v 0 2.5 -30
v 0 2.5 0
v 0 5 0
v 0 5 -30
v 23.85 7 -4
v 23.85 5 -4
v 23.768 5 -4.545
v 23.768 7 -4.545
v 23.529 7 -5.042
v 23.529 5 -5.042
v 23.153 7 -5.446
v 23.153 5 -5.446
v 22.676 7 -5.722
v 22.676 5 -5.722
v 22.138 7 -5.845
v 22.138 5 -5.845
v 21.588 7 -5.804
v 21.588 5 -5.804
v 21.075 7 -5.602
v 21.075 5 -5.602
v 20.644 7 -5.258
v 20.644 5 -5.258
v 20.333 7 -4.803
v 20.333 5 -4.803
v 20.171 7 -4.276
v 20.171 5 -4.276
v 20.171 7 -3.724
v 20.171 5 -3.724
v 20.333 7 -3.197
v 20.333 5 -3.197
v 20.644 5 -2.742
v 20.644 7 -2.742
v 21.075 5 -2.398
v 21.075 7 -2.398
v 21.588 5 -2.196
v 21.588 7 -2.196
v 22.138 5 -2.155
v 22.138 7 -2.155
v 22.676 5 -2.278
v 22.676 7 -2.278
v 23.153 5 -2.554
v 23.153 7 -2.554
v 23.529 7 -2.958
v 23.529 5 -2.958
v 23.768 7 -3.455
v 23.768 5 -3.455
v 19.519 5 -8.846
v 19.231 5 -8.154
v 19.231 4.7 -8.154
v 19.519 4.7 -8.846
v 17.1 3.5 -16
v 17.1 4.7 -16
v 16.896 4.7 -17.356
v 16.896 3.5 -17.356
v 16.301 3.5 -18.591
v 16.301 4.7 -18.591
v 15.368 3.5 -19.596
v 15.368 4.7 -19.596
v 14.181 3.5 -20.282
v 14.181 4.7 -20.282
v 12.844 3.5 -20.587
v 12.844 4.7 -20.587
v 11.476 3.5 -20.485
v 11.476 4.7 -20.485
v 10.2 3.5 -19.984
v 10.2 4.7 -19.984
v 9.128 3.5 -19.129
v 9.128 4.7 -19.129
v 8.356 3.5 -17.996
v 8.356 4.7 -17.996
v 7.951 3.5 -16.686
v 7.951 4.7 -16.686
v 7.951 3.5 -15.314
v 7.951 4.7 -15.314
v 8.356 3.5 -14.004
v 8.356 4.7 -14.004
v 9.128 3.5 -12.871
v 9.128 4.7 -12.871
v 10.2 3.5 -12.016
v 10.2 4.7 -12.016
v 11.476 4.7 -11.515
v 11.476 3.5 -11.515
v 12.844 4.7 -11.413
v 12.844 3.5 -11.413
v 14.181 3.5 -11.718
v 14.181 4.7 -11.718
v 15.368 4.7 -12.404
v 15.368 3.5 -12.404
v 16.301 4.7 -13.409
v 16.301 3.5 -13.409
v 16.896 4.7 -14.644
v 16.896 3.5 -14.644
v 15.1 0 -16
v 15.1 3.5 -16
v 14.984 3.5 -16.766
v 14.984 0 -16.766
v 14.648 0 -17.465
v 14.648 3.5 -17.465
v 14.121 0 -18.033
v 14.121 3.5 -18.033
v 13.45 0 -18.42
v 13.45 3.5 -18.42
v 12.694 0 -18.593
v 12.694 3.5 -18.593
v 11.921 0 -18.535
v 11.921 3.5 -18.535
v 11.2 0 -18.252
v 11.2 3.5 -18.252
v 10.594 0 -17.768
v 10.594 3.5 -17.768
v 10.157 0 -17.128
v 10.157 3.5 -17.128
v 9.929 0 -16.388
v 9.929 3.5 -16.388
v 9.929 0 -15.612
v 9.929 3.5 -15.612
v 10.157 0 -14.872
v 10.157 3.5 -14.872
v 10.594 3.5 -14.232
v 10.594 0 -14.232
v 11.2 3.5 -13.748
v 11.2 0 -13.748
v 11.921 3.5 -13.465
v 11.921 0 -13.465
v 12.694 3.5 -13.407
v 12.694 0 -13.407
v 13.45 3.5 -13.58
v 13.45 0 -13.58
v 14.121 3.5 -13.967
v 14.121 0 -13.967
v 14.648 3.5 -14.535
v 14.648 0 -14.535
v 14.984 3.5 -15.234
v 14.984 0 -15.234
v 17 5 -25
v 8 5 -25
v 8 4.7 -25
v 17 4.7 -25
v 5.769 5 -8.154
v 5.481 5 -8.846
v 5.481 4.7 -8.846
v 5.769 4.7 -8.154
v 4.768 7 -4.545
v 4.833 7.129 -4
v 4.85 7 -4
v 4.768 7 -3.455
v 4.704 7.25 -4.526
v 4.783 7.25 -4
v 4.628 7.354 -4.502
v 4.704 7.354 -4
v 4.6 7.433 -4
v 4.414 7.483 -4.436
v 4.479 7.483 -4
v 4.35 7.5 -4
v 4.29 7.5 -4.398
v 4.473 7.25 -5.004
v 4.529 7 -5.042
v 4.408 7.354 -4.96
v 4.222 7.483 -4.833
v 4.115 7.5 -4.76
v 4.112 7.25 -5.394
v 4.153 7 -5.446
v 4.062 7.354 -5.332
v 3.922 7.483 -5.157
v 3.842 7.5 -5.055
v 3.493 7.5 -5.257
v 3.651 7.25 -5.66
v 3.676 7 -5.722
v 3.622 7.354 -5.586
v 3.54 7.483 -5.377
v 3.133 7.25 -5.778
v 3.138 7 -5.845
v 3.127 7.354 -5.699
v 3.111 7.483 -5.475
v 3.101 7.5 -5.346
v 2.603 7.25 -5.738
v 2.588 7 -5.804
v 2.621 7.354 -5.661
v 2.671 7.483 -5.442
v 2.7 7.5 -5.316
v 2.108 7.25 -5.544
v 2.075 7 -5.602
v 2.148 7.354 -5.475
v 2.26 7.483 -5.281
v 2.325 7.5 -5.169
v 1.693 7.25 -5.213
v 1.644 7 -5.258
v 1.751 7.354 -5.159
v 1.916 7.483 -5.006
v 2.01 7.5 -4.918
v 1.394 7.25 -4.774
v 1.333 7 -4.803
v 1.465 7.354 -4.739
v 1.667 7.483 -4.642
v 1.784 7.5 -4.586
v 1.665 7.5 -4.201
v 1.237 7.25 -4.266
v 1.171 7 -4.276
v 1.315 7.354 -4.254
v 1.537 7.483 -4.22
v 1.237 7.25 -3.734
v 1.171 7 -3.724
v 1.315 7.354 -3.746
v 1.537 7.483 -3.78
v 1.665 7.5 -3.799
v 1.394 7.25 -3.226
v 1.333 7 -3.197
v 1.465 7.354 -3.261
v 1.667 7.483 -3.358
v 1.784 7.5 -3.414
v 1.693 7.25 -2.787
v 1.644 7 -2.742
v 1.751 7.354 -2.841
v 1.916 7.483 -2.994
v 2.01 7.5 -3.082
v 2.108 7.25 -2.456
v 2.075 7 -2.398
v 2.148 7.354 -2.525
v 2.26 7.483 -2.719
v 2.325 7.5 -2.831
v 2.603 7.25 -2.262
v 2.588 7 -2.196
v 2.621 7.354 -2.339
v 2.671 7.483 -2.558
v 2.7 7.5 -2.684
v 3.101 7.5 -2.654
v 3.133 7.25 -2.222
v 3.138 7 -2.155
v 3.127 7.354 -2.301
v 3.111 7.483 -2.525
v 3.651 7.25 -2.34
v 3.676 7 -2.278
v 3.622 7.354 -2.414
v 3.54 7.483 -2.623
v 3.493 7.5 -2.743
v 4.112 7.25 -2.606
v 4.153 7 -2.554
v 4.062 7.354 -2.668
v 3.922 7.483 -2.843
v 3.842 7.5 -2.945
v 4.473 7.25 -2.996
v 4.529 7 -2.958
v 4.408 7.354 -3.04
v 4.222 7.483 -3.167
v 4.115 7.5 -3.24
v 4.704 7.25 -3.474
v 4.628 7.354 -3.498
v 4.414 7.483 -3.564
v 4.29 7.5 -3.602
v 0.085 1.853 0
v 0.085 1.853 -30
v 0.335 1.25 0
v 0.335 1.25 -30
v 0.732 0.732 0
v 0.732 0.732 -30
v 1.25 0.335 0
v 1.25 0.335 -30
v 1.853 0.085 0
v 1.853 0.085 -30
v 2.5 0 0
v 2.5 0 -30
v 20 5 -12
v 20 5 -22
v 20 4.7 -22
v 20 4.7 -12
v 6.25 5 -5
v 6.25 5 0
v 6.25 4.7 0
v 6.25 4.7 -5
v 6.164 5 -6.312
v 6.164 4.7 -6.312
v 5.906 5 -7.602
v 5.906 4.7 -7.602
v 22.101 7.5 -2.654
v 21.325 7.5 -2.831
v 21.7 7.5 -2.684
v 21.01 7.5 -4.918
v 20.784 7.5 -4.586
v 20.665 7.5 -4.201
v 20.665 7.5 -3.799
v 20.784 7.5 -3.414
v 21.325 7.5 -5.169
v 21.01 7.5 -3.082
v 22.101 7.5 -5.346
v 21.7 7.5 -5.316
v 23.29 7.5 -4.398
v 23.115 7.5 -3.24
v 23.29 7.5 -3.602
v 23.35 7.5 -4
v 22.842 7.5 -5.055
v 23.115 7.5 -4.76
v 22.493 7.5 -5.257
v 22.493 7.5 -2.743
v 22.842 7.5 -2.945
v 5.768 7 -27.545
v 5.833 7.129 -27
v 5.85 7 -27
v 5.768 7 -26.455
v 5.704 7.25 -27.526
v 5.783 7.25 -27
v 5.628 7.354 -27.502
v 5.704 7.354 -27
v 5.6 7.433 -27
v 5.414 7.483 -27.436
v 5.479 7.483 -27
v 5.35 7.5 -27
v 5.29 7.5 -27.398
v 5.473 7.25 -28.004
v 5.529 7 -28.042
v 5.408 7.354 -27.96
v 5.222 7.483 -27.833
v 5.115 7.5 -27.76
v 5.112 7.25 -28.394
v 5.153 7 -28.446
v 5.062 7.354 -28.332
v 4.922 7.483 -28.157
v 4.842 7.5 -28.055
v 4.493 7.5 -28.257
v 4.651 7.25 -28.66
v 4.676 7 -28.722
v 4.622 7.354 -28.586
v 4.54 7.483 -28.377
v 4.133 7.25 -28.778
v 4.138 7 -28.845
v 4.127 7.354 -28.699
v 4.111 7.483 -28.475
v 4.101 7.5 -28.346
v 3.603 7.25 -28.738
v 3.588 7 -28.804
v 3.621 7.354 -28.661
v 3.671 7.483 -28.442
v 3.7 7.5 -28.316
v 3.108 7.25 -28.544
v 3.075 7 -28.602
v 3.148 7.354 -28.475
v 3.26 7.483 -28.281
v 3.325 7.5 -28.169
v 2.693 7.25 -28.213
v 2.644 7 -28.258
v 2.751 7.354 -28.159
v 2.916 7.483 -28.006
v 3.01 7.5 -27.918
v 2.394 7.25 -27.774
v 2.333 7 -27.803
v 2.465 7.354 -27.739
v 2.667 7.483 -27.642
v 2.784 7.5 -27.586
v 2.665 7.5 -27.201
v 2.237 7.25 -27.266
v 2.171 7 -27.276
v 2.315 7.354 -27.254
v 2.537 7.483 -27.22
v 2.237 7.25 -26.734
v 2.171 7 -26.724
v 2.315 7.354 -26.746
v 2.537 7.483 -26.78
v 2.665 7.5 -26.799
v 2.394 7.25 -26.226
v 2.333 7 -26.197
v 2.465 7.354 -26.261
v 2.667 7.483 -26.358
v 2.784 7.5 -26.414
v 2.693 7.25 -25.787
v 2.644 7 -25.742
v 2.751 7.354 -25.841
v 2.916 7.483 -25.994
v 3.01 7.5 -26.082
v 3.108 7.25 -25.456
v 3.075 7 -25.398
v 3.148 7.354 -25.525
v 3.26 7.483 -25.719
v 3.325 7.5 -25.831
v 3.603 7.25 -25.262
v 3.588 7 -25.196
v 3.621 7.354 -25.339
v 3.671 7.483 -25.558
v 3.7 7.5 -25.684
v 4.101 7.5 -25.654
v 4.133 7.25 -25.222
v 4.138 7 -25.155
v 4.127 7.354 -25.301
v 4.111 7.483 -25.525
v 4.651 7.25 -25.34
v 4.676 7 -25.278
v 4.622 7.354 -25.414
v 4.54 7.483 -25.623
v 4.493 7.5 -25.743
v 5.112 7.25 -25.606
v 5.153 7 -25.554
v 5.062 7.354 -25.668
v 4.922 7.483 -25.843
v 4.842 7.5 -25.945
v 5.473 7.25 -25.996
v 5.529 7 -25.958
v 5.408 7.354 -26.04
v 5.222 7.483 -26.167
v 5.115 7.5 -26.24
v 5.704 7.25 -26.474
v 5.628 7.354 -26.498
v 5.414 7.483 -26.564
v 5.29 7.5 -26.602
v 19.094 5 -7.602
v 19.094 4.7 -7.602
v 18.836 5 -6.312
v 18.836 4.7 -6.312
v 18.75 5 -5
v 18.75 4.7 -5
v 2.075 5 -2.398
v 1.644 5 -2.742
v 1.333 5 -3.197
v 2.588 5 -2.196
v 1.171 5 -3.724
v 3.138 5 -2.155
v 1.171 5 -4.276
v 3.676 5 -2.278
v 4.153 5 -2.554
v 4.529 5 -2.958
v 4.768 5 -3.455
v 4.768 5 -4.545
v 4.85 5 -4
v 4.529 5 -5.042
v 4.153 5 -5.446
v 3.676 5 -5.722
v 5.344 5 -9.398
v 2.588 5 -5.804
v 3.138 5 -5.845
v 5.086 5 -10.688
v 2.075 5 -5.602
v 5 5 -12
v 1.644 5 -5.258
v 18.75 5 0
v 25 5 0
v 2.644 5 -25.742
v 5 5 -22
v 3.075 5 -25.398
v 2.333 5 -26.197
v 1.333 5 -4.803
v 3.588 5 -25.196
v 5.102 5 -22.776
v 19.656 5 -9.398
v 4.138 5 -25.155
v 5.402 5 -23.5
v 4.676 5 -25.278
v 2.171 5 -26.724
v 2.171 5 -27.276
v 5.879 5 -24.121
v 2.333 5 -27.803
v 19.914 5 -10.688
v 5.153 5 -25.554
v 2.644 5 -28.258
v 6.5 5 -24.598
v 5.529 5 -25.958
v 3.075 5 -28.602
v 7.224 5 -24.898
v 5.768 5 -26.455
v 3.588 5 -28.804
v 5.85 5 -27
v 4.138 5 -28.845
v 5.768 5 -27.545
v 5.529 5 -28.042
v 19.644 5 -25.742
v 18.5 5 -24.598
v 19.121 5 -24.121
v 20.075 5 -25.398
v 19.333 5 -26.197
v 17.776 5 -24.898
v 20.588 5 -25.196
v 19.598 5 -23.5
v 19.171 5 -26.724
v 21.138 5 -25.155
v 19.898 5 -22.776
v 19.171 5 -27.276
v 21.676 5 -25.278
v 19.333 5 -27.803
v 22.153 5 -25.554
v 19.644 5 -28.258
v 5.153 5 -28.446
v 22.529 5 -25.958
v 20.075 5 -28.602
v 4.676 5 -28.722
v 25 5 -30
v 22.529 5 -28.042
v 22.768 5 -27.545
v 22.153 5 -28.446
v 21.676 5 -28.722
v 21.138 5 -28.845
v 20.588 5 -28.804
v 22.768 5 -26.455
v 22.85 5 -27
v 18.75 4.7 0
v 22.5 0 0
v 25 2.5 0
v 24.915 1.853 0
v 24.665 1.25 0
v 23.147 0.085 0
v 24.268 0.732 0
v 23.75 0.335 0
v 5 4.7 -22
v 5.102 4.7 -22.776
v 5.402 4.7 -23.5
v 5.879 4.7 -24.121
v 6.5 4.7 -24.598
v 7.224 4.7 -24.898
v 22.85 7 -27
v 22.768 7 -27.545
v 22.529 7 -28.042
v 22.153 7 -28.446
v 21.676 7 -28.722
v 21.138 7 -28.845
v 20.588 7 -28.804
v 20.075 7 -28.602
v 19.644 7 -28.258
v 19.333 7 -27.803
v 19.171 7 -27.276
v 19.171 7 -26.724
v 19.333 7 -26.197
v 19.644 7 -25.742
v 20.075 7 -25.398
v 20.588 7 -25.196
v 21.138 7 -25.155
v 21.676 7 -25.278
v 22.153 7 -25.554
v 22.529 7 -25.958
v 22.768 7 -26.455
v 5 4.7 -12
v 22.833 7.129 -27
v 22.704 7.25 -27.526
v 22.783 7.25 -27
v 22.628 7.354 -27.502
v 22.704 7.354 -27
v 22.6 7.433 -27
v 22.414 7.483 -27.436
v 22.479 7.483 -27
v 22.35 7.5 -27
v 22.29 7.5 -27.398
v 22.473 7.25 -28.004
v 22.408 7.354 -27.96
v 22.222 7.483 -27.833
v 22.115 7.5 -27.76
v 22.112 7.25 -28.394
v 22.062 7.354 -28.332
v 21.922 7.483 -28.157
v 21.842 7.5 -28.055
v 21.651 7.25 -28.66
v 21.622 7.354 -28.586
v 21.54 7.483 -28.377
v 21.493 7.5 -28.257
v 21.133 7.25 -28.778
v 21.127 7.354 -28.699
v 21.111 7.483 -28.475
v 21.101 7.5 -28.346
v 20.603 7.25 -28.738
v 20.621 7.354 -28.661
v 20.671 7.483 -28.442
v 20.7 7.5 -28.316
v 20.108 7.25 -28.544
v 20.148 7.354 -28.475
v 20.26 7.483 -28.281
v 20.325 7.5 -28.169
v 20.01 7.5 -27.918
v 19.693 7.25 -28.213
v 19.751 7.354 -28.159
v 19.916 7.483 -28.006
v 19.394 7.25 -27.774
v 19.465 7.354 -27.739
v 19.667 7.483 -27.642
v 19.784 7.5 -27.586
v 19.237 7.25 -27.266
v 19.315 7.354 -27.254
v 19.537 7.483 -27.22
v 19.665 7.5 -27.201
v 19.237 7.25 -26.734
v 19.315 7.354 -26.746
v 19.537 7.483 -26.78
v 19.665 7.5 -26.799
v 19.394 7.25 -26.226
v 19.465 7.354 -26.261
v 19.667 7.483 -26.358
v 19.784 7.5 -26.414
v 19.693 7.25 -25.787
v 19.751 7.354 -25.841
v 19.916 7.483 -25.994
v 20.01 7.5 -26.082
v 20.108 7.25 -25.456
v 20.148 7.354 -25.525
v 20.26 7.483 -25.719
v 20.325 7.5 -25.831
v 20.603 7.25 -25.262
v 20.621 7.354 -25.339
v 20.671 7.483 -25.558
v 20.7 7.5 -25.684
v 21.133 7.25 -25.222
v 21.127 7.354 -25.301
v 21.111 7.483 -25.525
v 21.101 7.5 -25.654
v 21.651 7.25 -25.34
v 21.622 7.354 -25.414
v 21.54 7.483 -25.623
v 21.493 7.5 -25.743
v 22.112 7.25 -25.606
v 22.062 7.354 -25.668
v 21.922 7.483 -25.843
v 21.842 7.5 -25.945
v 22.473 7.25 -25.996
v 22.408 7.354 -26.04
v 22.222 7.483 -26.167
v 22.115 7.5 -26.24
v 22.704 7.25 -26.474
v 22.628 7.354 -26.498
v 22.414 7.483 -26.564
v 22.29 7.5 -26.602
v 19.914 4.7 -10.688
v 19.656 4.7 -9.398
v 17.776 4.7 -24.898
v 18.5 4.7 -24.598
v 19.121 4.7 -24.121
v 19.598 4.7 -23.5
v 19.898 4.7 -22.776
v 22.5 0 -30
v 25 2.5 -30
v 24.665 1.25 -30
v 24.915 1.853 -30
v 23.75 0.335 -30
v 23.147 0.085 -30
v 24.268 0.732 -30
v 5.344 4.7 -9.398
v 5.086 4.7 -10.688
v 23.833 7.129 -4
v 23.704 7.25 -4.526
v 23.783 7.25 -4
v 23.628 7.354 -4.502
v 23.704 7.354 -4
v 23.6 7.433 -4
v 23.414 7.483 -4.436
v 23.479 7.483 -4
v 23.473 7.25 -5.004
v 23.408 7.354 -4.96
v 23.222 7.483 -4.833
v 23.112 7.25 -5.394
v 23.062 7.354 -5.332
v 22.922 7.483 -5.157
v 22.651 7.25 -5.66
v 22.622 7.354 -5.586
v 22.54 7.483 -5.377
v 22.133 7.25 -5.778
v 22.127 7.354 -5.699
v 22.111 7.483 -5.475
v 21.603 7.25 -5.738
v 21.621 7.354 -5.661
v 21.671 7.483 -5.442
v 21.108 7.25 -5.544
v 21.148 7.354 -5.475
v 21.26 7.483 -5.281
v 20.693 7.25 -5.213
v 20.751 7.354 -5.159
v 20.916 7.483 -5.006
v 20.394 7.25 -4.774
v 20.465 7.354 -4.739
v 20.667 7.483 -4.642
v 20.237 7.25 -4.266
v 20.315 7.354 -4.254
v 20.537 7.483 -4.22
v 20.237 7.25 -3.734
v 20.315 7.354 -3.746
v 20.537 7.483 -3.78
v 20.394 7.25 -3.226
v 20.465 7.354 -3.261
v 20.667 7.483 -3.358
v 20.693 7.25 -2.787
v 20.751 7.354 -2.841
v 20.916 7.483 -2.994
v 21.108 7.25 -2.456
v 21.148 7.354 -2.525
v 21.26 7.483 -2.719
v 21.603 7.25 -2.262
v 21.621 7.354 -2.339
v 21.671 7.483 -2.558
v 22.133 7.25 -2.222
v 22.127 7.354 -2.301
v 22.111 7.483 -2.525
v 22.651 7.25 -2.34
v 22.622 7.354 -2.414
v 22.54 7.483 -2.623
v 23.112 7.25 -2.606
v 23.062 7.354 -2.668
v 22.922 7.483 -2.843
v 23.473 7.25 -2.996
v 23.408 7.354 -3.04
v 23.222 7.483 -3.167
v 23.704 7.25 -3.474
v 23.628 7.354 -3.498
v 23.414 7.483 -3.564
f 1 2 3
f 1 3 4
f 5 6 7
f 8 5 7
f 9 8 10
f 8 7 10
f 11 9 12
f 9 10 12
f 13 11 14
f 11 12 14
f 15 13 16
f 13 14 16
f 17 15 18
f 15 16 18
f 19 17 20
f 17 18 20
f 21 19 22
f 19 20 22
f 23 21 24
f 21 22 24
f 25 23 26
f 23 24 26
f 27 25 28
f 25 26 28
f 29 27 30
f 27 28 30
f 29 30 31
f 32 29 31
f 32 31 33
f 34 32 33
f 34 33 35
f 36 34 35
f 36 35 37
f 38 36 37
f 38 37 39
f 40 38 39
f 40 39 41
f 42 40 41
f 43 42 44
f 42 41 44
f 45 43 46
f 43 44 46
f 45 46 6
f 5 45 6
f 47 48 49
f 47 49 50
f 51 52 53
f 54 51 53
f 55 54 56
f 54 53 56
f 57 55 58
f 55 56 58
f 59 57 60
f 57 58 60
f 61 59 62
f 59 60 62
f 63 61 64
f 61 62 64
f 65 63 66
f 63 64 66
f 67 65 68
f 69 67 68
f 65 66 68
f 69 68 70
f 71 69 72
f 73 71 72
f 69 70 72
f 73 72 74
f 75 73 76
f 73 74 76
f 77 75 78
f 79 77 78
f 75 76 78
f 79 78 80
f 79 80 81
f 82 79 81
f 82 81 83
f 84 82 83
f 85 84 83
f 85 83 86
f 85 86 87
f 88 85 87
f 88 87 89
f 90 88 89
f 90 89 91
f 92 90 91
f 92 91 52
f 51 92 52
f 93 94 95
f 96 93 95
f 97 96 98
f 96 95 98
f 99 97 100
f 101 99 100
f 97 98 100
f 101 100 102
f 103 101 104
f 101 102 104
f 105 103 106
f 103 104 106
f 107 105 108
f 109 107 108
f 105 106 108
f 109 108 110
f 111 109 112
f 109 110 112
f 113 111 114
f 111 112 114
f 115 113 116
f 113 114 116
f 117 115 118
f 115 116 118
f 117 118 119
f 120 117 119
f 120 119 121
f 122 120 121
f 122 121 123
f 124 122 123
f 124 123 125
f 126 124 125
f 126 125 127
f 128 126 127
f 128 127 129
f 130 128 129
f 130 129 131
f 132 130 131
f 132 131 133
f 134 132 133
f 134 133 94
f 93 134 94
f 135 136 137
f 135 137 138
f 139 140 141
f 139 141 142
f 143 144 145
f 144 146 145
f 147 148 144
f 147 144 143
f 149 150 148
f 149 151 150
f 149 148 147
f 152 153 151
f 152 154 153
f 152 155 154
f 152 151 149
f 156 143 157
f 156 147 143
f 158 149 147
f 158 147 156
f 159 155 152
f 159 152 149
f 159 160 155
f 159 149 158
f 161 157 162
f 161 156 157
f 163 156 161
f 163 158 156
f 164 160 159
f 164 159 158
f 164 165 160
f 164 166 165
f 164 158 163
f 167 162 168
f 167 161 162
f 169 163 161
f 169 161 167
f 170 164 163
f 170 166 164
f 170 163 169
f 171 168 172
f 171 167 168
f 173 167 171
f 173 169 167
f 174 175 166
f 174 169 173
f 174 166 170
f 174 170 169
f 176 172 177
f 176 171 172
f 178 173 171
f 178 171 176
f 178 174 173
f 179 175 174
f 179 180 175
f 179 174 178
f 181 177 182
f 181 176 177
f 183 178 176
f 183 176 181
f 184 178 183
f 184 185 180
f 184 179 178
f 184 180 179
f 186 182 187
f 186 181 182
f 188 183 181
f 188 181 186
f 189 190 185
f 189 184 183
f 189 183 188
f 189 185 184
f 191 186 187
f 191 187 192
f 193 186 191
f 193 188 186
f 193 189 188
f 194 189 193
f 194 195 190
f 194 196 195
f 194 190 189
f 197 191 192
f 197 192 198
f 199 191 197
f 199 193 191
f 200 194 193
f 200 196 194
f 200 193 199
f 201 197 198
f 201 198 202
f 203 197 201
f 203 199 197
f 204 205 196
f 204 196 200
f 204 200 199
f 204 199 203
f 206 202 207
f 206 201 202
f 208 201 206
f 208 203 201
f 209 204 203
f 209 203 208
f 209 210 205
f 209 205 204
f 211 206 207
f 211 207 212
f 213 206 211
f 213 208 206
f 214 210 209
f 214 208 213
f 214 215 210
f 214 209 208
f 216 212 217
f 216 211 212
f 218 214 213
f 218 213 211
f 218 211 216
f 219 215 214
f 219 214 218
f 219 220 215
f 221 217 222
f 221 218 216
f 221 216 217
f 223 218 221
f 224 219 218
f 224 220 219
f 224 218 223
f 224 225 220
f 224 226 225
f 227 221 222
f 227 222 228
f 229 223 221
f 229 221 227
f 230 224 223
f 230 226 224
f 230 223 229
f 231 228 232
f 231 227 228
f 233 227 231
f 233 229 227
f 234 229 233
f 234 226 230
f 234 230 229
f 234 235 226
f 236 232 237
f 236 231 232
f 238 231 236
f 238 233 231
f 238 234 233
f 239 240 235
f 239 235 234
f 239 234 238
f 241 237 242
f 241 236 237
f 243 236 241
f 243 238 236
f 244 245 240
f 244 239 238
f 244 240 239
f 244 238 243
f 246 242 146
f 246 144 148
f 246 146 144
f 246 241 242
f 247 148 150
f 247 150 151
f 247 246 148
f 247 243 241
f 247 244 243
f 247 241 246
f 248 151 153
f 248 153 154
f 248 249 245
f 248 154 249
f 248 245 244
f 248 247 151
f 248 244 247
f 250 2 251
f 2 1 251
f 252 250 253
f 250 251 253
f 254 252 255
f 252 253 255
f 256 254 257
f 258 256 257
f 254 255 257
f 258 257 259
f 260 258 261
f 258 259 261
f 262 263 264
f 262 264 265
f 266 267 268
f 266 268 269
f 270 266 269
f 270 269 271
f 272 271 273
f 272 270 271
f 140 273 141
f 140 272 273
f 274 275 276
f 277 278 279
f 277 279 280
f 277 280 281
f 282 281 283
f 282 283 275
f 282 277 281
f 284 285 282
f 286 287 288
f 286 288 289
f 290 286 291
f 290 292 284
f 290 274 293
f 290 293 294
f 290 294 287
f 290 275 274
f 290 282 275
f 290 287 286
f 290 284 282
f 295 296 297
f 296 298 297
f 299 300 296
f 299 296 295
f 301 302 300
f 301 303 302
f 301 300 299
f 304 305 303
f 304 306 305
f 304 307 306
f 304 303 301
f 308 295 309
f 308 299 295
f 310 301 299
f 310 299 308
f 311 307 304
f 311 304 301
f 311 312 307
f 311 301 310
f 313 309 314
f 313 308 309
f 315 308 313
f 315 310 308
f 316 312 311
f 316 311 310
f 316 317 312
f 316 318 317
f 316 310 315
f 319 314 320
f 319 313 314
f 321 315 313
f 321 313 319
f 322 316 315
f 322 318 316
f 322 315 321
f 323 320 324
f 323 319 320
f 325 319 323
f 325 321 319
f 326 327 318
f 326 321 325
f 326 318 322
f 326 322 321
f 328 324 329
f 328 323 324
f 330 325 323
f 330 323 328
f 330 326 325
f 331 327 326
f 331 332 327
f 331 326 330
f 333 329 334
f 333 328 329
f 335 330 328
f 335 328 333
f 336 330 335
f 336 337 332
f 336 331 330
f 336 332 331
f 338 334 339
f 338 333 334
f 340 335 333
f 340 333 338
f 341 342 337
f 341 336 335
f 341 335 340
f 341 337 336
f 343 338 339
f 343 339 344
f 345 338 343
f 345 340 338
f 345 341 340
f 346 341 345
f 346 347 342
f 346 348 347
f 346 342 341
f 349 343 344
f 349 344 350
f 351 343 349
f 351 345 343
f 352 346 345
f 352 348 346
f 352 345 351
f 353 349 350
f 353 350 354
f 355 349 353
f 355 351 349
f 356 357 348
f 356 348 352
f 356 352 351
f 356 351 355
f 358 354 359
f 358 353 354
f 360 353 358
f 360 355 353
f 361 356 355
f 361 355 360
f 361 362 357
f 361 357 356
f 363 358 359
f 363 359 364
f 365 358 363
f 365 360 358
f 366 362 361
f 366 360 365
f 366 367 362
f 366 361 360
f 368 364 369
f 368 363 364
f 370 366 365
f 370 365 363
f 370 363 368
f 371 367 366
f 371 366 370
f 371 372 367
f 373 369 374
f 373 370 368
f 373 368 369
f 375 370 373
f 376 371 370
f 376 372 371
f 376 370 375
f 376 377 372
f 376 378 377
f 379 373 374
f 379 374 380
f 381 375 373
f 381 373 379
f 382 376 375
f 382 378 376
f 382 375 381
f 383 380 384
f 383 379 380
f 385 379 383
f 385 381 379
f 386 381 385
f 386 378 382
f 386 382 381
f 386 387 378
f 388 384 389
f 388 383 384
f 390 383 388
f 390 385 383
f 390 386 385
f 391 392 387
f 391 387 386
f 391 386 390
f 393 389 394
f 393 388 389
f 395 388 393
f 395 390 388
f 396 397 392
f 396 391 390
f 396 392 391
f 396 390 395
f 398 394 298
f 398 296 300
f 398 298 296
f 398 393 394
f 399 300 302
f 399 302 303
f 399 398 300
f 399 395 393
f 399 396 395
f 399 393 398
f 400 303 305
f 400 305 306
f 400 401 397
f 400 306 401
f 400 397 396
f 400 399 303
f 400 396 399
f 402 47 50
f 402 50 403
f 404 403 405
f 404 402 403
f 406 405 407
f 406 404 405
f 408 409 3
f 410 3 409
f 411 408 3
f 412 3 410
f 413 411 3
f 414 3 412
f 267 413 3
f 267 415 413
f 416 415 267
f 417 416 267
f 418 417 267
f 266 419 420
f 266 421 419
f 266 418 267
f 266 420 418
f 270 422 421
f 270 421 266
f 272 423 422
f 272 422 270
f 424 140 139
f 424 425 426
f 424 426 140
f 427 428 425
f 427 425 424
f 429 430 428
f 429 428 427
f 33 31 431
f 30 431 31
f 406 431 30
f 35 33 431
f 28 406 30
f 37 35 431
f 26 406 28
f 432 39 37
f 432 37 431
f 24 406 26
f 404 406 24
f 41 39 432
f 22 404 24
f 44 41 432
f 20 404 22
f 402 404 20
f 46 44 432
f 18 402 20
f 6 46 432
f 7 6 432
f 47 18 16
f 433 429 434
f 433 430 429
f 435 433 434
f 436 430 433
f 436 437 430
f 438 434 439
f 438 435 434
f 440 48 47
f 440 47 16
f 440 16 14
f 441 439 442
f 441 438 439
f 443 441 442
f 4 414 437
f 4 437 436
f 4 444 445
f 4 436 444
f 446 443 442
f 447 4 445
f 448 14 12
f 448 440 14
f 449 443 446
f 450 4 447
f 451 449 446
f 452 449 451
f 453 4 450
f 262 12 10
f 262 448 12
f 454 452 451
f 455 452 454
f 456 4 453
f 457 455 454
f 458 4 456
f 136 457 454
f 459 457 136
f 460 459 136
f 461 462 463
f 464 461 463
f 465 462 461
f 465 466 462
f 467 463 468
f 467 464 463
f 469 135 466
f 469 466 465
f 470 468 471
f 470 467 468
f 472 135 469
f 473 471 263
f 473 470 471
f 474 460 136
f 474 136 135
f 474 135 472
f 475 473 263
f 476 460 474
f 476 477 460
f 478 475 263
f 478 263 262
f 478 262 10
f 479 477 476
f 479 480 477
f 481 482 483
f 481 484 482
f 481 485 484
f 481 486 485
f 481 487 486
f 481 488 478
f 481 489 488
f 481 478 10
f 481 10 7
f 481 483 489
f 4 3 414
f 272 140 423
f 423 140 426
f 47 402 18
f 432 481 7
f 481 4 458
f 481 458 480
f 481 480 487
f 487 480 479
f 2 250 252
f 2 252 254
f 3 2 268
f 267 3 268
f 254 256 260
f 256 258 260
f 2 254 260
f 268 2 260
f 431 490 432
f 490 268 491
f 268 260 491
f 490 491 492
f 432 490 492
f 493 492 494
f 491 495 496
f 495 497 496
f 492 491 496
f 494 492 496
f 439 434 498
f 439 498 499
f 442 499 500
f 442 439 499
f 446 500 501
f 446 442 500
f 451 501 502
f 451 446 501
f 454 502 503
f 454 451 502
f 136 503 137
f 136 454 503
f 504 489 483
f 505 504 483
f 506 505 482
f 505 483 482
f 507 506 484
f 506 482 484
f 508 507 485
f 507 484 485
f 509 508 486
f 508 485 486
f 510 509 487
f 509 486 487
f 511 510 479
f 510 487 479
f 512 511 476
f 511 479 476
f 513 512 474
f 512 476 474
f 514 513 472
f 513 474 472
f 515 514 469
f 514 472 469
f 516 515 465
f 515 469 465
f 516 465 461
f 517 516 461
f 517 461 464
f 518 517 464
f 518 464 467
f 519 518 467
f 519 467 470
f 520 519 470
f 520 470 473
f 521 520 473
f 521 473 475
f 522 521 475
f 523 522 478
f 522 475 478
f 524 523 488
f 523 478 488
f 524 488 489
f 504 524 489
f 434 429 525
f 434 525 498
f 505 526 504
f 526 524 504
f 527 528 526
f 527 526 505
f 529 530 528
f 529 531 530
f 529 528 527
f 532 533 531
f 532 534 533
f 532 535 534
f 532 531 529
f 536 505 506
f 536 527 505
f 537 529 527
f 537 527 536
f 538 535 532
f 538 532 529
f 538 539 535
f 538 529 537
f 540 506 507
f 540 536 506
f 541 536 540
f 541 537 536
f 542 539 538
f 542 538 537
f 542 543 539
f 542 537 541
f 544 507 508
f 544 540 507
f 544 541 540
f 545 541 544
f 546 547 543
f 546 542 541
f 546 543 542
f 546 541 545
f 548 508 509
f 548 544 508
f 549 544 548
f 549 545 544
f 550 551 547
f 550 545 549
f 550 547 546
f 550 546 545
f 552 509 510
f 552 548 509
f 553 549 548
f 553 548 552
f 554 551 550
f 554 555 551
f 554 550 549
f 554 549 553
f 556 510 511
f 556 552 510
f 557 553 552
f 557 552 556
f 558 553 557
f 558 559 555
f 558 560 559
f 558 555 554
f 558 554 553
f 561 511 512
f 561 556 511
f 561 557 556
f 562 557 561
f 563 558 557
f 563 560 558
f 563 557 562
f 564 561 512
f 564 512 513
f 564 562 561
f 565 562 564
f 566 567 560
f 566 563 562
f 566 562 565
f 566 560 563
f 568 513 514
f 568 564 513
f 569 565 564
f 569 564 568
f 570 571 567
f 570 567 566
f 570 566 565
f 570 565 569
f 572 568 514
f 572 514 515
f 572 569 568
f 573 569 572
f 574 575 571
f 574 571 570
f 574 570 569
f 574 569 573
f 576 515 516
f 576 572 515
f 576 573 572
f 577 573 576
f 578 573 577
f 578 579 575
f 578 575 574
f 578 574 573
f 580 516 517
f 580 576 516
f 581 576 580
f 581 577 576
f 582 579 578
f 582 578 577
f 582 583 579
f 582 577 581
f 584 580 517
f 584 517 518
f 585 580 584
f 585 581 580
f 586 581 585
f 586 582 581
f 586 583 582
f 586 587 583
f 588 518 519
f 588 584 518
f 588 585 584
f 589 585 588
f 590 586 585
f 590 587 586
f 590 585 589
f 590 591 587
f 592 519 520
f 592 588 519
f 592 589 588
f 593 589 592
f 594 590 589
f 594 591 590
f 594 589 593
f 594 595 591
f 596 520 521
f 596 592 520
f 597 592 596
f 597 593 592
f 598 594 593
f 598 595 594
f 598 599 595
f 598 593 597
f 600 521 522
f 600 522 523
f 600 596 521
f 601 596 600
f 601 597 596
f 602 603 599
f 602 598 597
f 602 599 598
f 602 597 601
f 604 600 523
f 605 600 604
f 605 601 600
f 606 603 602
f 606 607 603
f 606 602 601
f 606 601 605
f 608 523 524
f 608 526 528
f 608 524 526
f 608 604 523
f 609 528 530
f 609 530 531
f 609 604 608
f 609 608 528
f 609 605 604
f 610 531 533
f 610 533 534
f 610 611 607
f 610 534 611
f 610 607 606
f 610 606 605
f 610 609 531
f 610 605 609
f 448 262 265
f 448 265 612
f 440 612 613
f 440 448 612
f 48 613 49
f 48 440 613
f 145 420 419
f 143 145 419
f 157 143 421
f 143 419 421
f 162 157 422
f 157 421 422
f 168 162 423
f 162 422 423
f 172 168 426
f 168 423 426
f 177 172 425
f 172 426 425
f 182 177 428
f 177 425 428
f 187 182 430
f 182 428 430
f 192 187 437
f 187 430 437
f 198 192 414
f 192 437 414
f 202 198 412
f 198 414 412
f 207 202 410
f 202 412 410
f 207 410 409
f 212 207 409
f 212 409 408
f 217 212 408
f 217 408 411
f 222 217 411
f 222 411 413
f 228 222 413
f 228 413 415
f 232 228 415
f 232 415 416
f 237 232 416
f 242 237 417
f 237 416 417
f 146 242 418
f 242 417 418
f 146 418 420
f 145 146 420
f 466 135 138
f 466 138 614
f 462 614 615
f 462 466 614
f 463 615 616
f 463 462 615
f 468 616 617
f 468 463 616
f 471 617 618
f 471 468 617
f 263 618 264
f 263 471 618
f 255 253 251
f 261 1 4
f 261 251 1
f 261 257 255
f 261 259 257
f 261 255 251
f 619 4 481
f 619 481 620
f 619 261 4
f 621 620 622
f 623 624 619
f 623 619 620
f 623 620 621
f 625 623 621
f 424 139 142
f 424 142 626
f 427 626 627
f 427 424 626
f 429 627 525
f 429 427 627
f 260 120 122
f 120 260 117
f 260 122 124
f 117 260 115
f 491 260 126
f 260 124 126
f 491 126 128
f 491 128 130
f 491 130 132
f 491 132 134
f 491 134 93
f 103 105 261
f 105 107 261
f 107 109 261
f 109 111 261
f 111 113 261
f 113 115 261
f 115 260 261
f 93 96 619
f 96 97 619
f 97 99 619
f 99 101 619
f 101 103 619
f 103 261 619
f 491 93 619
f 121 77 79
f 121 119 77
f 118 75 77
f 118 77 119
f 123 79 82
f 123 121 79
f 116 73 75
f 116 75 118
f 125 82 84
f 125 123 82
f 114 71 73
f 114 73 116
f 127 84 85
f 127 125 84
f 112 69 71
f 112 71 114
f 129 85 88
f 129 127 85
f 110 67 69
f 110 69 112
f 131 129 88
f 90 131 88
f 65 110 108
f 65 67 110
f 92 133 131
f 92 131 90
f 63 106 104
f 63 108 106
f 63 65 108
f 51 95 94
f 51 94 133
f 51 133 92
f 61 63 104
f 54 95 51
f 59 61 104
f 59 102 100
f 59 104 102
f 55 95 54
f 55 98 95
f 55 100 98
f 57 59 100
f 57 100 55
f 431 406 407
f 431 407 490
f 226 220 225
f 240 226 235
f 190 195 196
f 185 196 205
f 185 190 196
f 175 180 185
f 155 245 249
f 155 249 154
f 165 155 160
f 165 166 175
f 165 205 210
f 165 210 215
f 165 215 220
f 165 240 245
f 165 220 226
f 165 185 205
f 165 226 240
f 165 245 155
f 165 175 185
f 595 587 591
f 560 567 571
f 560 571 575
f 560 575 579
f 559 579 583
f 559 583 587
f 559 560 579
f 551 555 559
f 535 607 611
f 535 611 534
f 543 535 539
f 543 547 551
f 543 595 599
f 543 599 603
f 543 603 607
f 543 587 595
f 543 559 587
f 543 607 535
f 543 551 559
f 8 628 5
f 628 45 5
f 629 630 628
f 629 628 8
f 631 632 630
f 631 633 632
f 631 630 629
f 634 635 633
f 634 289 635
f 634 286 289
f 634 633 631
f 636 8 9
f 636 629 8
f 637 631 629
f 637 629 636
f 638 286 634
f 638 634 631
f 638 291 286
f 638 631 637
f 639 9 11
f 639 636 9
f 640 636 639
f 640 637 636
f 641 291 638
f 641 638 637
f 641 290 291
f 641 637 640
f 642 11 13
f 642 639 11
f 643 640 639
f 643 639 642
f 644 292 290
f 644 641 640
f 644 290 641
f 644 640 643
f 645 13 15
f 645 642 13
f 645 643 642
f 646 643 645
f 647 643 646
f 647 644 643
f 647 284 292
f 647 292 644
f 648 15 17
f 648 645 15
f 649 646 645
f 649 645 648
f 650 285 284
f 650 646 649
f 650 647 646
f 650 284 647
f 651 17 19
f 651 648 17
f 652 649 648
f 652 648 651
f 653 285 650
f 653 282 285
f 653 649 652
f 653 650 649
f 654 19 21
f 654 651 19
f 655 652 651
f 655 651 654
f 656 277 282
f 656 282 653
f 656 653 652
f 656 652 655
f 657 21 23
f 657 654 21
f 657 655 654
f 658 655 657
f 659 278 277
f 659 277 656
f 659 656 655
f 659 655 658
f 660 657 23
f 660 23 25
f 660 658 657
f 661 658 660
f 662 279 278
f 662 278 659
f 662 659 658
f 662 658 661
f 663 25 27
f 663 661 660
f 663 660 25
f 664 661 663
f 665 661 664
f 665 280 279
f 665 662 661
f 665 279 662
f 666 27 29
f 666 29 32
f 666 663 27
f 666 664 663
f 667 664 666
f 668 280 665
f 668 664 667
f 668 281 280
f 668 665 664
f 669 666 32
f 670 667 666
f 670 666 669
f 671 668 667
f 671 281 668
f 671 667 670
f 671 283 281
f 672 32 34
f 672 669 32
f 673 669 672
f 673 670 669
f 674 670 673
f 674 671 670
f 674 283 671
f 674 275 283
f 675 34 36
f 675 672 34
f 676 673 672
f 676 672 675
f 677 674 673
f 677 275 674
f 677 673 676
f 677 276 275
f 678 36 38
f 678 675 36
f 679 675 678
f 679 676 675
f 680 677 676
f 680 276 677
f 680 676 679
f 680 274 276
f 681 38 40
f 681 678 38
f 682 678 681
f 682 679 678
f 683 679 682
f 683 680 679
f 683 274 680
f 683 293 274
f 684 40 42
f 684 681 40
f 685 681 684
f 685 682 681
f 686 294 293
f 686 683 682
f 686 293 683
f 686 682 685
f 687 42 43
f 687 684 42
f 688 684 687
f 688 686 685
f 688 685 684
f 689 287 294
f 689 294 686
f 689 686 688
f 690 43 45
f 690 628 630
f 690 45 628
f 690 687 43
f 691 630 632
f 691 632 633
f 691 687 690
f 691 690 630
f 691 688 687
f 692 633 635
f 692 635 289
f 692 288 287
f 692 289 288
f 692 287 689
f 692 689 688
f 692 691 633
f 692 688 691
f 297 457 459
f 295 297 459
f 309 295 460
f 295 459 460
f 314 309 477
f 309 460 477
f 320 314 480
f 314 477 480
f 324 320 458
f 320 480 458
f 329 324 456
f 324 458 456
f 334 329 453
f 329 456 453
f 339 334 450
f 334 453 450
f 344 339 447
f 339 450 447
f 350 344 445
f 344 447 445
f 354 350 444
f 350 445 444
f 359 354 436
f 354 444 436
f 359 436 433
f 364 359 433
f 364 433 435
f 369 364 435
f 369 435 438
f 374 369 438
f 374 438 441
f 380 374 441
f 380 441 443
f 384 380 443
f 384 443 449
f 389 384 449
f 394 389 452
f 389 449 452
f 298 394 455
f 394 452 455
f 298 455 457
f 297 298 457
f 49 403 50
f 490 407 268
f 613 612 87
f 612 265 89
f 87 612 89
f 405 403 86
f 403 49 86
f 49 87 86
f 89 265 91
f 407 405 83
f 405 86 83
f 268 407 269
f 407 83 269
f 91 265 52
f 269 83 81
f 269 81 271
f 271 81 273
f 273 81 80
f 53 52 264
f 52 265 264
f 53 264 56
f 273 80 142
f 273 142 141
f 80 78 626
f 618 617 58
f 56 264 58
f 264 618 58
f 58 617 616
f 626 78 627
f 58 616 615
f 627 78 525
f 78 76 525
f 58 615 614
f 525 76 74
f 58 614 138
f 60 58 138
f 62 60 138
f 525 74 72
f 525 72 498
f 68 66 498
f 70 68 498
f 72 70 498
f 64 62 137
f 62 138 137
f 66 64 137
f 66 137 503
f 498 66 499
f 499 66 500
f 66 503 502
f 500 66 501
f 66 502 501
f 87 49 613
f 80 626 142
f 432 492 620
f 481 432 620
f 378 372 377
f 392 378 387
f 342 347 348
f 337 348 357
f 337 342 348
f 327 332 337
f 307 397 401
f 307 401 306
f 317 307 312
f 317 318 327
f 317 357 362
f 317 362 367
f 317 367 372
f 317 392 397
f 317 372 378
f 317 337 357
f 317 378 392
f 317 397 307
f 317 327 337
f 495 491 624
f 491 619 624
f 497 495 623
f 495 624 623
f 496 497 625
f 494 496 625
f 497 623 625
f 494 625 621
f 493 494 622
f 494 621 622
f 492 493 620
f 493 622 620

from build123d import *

# Parameters (mm, degrees)
SKETCH1_W           = 25
SKETCH1_H           = 30
BOSS_EXTRUDE1_DEPTH = 5
CUT_EXTRUDE1_DEPTH  = 0.3
SKETCH3_R           = 1.85
BOSS_EXTRUDE2_DEPTH = 2.5
FILLET3_R           = 2.5
SKETCH2_3_R         = 2.6
CUT_EXTRUDE7_DEPTH  = 10
SKETCH2_4_R         = 4.6
CUT_EXTRUDE8_DEPTH  = 1.5
FILLET4_R           = 0.5


with BuildPart() as part:
    # Sketch1 → Boss-Extrude1 (new body)
    with BuildSketch(Plane(origin=(0, 0, 0), x_dir=(1, 0, 0), z_dir=(0, 1, 0))):
        with Locations((12.5, 15)):
            Rectangle(SKETCH1_W, SKETCH1_H)
    extrude(amount=BOSS_EXTRUDE1_DEPTH)

    # Sketch2 → Cut-Extrude1 (cut)
    with BuildSketch(Plane(origin=(0, 5, 0), x_dir=(1, 0, 0), z_dir=(0, 1, 0))):
        with BuildLine():
            Line((8, 25), (17, 25))
            ThreePointArc((17, 25), (19.121320344, 24.121320344), (20, 22))
            Line((20, 22), (20, 12))
            ThreePointArc((20, 12), (19.805806757, 10.038838649), (19.230769231, 8.153846154))
            Line((19.230769231, 8.153846154), (19.519230769, 8.846153846))
            ThreePointArc((19.519230769, 8.846153846), (18.944193243, 6.961161351), (18.75, 5))
            Line((18.75, 5), (18.75, 0))
            Line((18.75, 0), (6.25, 0))
            Line((6.25, 0), (6.25, 5))
            ThreePointArc((6.25, 5), (6.055806757, 6.961161351), (5.480769231, 8.846153846))
            Line((5.480769231, 8.846153846), (5.769230769, 8.153846154))
            ThreePointArc((5.769230769, 8.153846154), (5.194193243, 10.038838649), (5, 12))
            Line((5, 12), (5, 22))
            ThreePointArc((5, 22), (5.878679656, 24.121320344), (8, 25))
        make_face()
    extrude(amount=-CUT_EXTRUDE1_DEPTH, mode=Mode.SUBTRACT)

    # Sketch3 → Boss-Extrude2 (add)
    with BuildSketch(Plane(origin=(0, 5, 0), x_dir=(1, 0, 0), z_dir=(0, 1, 0))):
        with Locations((21, 27)):
            Circle(SKETCH3_R)
        with Locations((4, 27)):
            Circle(SKETCH3_R)
        with Locations((3, 4)):
            Circle(SKETCH3_R)
        with Locations((22, 4)):
            Circle(SKETCH3_R)
    extrude(amount=BOSS_EXTRUDE2_DEPTH)

    # Fillet3
    fillet3_edges = [part.edges().sort_by_distance(p)[0] for p in [
        (25, 0, -15),
        (0, 0, -15),
    ]]
    fillet(fillet3_edges, radius=FILLET3_R)

    # Sketch2_3 → Cut-Extrude7 (cut)
    with BuildSketch(Plane(origin=(0, 5, 0), x_dir=(1, 0, 0), z_dir=(0, 1, 0))):
        with Locations((12.5, 16)):
            Circle(SKETCH2_3_R)
    extrude(amount=-CUT_EXTRUDE7_DEPTH, mode=Mode.SUBTRACT)

    # Sketch2_4 → Cut-Extrude8 (cut)
    with BuildSketch(Plane(origin=(0, 5, 0), x_dir=(1, 0, 0), z_dir=(0, 1, 0))):
        with Locations((12.5, 16)):
            Circle(SKETCH2_4_R)
    extrude(amount=-CUT_EXTRUDE8_DEPTH, mode=Mode.SUBTRACT)

    # Fillet4
    fillet4_edges = [part.edges().sort_by_distance(p)[0] for p in [
        (2.15, 7.5, -27),
        (19.15, 7.5, -27),
        (20.15, 7.5, -4),
        (1.15, 7.5, -4),
    ]]
    fillet(fillet4_edges, radius=FILLET4_R)


solid = part.part
